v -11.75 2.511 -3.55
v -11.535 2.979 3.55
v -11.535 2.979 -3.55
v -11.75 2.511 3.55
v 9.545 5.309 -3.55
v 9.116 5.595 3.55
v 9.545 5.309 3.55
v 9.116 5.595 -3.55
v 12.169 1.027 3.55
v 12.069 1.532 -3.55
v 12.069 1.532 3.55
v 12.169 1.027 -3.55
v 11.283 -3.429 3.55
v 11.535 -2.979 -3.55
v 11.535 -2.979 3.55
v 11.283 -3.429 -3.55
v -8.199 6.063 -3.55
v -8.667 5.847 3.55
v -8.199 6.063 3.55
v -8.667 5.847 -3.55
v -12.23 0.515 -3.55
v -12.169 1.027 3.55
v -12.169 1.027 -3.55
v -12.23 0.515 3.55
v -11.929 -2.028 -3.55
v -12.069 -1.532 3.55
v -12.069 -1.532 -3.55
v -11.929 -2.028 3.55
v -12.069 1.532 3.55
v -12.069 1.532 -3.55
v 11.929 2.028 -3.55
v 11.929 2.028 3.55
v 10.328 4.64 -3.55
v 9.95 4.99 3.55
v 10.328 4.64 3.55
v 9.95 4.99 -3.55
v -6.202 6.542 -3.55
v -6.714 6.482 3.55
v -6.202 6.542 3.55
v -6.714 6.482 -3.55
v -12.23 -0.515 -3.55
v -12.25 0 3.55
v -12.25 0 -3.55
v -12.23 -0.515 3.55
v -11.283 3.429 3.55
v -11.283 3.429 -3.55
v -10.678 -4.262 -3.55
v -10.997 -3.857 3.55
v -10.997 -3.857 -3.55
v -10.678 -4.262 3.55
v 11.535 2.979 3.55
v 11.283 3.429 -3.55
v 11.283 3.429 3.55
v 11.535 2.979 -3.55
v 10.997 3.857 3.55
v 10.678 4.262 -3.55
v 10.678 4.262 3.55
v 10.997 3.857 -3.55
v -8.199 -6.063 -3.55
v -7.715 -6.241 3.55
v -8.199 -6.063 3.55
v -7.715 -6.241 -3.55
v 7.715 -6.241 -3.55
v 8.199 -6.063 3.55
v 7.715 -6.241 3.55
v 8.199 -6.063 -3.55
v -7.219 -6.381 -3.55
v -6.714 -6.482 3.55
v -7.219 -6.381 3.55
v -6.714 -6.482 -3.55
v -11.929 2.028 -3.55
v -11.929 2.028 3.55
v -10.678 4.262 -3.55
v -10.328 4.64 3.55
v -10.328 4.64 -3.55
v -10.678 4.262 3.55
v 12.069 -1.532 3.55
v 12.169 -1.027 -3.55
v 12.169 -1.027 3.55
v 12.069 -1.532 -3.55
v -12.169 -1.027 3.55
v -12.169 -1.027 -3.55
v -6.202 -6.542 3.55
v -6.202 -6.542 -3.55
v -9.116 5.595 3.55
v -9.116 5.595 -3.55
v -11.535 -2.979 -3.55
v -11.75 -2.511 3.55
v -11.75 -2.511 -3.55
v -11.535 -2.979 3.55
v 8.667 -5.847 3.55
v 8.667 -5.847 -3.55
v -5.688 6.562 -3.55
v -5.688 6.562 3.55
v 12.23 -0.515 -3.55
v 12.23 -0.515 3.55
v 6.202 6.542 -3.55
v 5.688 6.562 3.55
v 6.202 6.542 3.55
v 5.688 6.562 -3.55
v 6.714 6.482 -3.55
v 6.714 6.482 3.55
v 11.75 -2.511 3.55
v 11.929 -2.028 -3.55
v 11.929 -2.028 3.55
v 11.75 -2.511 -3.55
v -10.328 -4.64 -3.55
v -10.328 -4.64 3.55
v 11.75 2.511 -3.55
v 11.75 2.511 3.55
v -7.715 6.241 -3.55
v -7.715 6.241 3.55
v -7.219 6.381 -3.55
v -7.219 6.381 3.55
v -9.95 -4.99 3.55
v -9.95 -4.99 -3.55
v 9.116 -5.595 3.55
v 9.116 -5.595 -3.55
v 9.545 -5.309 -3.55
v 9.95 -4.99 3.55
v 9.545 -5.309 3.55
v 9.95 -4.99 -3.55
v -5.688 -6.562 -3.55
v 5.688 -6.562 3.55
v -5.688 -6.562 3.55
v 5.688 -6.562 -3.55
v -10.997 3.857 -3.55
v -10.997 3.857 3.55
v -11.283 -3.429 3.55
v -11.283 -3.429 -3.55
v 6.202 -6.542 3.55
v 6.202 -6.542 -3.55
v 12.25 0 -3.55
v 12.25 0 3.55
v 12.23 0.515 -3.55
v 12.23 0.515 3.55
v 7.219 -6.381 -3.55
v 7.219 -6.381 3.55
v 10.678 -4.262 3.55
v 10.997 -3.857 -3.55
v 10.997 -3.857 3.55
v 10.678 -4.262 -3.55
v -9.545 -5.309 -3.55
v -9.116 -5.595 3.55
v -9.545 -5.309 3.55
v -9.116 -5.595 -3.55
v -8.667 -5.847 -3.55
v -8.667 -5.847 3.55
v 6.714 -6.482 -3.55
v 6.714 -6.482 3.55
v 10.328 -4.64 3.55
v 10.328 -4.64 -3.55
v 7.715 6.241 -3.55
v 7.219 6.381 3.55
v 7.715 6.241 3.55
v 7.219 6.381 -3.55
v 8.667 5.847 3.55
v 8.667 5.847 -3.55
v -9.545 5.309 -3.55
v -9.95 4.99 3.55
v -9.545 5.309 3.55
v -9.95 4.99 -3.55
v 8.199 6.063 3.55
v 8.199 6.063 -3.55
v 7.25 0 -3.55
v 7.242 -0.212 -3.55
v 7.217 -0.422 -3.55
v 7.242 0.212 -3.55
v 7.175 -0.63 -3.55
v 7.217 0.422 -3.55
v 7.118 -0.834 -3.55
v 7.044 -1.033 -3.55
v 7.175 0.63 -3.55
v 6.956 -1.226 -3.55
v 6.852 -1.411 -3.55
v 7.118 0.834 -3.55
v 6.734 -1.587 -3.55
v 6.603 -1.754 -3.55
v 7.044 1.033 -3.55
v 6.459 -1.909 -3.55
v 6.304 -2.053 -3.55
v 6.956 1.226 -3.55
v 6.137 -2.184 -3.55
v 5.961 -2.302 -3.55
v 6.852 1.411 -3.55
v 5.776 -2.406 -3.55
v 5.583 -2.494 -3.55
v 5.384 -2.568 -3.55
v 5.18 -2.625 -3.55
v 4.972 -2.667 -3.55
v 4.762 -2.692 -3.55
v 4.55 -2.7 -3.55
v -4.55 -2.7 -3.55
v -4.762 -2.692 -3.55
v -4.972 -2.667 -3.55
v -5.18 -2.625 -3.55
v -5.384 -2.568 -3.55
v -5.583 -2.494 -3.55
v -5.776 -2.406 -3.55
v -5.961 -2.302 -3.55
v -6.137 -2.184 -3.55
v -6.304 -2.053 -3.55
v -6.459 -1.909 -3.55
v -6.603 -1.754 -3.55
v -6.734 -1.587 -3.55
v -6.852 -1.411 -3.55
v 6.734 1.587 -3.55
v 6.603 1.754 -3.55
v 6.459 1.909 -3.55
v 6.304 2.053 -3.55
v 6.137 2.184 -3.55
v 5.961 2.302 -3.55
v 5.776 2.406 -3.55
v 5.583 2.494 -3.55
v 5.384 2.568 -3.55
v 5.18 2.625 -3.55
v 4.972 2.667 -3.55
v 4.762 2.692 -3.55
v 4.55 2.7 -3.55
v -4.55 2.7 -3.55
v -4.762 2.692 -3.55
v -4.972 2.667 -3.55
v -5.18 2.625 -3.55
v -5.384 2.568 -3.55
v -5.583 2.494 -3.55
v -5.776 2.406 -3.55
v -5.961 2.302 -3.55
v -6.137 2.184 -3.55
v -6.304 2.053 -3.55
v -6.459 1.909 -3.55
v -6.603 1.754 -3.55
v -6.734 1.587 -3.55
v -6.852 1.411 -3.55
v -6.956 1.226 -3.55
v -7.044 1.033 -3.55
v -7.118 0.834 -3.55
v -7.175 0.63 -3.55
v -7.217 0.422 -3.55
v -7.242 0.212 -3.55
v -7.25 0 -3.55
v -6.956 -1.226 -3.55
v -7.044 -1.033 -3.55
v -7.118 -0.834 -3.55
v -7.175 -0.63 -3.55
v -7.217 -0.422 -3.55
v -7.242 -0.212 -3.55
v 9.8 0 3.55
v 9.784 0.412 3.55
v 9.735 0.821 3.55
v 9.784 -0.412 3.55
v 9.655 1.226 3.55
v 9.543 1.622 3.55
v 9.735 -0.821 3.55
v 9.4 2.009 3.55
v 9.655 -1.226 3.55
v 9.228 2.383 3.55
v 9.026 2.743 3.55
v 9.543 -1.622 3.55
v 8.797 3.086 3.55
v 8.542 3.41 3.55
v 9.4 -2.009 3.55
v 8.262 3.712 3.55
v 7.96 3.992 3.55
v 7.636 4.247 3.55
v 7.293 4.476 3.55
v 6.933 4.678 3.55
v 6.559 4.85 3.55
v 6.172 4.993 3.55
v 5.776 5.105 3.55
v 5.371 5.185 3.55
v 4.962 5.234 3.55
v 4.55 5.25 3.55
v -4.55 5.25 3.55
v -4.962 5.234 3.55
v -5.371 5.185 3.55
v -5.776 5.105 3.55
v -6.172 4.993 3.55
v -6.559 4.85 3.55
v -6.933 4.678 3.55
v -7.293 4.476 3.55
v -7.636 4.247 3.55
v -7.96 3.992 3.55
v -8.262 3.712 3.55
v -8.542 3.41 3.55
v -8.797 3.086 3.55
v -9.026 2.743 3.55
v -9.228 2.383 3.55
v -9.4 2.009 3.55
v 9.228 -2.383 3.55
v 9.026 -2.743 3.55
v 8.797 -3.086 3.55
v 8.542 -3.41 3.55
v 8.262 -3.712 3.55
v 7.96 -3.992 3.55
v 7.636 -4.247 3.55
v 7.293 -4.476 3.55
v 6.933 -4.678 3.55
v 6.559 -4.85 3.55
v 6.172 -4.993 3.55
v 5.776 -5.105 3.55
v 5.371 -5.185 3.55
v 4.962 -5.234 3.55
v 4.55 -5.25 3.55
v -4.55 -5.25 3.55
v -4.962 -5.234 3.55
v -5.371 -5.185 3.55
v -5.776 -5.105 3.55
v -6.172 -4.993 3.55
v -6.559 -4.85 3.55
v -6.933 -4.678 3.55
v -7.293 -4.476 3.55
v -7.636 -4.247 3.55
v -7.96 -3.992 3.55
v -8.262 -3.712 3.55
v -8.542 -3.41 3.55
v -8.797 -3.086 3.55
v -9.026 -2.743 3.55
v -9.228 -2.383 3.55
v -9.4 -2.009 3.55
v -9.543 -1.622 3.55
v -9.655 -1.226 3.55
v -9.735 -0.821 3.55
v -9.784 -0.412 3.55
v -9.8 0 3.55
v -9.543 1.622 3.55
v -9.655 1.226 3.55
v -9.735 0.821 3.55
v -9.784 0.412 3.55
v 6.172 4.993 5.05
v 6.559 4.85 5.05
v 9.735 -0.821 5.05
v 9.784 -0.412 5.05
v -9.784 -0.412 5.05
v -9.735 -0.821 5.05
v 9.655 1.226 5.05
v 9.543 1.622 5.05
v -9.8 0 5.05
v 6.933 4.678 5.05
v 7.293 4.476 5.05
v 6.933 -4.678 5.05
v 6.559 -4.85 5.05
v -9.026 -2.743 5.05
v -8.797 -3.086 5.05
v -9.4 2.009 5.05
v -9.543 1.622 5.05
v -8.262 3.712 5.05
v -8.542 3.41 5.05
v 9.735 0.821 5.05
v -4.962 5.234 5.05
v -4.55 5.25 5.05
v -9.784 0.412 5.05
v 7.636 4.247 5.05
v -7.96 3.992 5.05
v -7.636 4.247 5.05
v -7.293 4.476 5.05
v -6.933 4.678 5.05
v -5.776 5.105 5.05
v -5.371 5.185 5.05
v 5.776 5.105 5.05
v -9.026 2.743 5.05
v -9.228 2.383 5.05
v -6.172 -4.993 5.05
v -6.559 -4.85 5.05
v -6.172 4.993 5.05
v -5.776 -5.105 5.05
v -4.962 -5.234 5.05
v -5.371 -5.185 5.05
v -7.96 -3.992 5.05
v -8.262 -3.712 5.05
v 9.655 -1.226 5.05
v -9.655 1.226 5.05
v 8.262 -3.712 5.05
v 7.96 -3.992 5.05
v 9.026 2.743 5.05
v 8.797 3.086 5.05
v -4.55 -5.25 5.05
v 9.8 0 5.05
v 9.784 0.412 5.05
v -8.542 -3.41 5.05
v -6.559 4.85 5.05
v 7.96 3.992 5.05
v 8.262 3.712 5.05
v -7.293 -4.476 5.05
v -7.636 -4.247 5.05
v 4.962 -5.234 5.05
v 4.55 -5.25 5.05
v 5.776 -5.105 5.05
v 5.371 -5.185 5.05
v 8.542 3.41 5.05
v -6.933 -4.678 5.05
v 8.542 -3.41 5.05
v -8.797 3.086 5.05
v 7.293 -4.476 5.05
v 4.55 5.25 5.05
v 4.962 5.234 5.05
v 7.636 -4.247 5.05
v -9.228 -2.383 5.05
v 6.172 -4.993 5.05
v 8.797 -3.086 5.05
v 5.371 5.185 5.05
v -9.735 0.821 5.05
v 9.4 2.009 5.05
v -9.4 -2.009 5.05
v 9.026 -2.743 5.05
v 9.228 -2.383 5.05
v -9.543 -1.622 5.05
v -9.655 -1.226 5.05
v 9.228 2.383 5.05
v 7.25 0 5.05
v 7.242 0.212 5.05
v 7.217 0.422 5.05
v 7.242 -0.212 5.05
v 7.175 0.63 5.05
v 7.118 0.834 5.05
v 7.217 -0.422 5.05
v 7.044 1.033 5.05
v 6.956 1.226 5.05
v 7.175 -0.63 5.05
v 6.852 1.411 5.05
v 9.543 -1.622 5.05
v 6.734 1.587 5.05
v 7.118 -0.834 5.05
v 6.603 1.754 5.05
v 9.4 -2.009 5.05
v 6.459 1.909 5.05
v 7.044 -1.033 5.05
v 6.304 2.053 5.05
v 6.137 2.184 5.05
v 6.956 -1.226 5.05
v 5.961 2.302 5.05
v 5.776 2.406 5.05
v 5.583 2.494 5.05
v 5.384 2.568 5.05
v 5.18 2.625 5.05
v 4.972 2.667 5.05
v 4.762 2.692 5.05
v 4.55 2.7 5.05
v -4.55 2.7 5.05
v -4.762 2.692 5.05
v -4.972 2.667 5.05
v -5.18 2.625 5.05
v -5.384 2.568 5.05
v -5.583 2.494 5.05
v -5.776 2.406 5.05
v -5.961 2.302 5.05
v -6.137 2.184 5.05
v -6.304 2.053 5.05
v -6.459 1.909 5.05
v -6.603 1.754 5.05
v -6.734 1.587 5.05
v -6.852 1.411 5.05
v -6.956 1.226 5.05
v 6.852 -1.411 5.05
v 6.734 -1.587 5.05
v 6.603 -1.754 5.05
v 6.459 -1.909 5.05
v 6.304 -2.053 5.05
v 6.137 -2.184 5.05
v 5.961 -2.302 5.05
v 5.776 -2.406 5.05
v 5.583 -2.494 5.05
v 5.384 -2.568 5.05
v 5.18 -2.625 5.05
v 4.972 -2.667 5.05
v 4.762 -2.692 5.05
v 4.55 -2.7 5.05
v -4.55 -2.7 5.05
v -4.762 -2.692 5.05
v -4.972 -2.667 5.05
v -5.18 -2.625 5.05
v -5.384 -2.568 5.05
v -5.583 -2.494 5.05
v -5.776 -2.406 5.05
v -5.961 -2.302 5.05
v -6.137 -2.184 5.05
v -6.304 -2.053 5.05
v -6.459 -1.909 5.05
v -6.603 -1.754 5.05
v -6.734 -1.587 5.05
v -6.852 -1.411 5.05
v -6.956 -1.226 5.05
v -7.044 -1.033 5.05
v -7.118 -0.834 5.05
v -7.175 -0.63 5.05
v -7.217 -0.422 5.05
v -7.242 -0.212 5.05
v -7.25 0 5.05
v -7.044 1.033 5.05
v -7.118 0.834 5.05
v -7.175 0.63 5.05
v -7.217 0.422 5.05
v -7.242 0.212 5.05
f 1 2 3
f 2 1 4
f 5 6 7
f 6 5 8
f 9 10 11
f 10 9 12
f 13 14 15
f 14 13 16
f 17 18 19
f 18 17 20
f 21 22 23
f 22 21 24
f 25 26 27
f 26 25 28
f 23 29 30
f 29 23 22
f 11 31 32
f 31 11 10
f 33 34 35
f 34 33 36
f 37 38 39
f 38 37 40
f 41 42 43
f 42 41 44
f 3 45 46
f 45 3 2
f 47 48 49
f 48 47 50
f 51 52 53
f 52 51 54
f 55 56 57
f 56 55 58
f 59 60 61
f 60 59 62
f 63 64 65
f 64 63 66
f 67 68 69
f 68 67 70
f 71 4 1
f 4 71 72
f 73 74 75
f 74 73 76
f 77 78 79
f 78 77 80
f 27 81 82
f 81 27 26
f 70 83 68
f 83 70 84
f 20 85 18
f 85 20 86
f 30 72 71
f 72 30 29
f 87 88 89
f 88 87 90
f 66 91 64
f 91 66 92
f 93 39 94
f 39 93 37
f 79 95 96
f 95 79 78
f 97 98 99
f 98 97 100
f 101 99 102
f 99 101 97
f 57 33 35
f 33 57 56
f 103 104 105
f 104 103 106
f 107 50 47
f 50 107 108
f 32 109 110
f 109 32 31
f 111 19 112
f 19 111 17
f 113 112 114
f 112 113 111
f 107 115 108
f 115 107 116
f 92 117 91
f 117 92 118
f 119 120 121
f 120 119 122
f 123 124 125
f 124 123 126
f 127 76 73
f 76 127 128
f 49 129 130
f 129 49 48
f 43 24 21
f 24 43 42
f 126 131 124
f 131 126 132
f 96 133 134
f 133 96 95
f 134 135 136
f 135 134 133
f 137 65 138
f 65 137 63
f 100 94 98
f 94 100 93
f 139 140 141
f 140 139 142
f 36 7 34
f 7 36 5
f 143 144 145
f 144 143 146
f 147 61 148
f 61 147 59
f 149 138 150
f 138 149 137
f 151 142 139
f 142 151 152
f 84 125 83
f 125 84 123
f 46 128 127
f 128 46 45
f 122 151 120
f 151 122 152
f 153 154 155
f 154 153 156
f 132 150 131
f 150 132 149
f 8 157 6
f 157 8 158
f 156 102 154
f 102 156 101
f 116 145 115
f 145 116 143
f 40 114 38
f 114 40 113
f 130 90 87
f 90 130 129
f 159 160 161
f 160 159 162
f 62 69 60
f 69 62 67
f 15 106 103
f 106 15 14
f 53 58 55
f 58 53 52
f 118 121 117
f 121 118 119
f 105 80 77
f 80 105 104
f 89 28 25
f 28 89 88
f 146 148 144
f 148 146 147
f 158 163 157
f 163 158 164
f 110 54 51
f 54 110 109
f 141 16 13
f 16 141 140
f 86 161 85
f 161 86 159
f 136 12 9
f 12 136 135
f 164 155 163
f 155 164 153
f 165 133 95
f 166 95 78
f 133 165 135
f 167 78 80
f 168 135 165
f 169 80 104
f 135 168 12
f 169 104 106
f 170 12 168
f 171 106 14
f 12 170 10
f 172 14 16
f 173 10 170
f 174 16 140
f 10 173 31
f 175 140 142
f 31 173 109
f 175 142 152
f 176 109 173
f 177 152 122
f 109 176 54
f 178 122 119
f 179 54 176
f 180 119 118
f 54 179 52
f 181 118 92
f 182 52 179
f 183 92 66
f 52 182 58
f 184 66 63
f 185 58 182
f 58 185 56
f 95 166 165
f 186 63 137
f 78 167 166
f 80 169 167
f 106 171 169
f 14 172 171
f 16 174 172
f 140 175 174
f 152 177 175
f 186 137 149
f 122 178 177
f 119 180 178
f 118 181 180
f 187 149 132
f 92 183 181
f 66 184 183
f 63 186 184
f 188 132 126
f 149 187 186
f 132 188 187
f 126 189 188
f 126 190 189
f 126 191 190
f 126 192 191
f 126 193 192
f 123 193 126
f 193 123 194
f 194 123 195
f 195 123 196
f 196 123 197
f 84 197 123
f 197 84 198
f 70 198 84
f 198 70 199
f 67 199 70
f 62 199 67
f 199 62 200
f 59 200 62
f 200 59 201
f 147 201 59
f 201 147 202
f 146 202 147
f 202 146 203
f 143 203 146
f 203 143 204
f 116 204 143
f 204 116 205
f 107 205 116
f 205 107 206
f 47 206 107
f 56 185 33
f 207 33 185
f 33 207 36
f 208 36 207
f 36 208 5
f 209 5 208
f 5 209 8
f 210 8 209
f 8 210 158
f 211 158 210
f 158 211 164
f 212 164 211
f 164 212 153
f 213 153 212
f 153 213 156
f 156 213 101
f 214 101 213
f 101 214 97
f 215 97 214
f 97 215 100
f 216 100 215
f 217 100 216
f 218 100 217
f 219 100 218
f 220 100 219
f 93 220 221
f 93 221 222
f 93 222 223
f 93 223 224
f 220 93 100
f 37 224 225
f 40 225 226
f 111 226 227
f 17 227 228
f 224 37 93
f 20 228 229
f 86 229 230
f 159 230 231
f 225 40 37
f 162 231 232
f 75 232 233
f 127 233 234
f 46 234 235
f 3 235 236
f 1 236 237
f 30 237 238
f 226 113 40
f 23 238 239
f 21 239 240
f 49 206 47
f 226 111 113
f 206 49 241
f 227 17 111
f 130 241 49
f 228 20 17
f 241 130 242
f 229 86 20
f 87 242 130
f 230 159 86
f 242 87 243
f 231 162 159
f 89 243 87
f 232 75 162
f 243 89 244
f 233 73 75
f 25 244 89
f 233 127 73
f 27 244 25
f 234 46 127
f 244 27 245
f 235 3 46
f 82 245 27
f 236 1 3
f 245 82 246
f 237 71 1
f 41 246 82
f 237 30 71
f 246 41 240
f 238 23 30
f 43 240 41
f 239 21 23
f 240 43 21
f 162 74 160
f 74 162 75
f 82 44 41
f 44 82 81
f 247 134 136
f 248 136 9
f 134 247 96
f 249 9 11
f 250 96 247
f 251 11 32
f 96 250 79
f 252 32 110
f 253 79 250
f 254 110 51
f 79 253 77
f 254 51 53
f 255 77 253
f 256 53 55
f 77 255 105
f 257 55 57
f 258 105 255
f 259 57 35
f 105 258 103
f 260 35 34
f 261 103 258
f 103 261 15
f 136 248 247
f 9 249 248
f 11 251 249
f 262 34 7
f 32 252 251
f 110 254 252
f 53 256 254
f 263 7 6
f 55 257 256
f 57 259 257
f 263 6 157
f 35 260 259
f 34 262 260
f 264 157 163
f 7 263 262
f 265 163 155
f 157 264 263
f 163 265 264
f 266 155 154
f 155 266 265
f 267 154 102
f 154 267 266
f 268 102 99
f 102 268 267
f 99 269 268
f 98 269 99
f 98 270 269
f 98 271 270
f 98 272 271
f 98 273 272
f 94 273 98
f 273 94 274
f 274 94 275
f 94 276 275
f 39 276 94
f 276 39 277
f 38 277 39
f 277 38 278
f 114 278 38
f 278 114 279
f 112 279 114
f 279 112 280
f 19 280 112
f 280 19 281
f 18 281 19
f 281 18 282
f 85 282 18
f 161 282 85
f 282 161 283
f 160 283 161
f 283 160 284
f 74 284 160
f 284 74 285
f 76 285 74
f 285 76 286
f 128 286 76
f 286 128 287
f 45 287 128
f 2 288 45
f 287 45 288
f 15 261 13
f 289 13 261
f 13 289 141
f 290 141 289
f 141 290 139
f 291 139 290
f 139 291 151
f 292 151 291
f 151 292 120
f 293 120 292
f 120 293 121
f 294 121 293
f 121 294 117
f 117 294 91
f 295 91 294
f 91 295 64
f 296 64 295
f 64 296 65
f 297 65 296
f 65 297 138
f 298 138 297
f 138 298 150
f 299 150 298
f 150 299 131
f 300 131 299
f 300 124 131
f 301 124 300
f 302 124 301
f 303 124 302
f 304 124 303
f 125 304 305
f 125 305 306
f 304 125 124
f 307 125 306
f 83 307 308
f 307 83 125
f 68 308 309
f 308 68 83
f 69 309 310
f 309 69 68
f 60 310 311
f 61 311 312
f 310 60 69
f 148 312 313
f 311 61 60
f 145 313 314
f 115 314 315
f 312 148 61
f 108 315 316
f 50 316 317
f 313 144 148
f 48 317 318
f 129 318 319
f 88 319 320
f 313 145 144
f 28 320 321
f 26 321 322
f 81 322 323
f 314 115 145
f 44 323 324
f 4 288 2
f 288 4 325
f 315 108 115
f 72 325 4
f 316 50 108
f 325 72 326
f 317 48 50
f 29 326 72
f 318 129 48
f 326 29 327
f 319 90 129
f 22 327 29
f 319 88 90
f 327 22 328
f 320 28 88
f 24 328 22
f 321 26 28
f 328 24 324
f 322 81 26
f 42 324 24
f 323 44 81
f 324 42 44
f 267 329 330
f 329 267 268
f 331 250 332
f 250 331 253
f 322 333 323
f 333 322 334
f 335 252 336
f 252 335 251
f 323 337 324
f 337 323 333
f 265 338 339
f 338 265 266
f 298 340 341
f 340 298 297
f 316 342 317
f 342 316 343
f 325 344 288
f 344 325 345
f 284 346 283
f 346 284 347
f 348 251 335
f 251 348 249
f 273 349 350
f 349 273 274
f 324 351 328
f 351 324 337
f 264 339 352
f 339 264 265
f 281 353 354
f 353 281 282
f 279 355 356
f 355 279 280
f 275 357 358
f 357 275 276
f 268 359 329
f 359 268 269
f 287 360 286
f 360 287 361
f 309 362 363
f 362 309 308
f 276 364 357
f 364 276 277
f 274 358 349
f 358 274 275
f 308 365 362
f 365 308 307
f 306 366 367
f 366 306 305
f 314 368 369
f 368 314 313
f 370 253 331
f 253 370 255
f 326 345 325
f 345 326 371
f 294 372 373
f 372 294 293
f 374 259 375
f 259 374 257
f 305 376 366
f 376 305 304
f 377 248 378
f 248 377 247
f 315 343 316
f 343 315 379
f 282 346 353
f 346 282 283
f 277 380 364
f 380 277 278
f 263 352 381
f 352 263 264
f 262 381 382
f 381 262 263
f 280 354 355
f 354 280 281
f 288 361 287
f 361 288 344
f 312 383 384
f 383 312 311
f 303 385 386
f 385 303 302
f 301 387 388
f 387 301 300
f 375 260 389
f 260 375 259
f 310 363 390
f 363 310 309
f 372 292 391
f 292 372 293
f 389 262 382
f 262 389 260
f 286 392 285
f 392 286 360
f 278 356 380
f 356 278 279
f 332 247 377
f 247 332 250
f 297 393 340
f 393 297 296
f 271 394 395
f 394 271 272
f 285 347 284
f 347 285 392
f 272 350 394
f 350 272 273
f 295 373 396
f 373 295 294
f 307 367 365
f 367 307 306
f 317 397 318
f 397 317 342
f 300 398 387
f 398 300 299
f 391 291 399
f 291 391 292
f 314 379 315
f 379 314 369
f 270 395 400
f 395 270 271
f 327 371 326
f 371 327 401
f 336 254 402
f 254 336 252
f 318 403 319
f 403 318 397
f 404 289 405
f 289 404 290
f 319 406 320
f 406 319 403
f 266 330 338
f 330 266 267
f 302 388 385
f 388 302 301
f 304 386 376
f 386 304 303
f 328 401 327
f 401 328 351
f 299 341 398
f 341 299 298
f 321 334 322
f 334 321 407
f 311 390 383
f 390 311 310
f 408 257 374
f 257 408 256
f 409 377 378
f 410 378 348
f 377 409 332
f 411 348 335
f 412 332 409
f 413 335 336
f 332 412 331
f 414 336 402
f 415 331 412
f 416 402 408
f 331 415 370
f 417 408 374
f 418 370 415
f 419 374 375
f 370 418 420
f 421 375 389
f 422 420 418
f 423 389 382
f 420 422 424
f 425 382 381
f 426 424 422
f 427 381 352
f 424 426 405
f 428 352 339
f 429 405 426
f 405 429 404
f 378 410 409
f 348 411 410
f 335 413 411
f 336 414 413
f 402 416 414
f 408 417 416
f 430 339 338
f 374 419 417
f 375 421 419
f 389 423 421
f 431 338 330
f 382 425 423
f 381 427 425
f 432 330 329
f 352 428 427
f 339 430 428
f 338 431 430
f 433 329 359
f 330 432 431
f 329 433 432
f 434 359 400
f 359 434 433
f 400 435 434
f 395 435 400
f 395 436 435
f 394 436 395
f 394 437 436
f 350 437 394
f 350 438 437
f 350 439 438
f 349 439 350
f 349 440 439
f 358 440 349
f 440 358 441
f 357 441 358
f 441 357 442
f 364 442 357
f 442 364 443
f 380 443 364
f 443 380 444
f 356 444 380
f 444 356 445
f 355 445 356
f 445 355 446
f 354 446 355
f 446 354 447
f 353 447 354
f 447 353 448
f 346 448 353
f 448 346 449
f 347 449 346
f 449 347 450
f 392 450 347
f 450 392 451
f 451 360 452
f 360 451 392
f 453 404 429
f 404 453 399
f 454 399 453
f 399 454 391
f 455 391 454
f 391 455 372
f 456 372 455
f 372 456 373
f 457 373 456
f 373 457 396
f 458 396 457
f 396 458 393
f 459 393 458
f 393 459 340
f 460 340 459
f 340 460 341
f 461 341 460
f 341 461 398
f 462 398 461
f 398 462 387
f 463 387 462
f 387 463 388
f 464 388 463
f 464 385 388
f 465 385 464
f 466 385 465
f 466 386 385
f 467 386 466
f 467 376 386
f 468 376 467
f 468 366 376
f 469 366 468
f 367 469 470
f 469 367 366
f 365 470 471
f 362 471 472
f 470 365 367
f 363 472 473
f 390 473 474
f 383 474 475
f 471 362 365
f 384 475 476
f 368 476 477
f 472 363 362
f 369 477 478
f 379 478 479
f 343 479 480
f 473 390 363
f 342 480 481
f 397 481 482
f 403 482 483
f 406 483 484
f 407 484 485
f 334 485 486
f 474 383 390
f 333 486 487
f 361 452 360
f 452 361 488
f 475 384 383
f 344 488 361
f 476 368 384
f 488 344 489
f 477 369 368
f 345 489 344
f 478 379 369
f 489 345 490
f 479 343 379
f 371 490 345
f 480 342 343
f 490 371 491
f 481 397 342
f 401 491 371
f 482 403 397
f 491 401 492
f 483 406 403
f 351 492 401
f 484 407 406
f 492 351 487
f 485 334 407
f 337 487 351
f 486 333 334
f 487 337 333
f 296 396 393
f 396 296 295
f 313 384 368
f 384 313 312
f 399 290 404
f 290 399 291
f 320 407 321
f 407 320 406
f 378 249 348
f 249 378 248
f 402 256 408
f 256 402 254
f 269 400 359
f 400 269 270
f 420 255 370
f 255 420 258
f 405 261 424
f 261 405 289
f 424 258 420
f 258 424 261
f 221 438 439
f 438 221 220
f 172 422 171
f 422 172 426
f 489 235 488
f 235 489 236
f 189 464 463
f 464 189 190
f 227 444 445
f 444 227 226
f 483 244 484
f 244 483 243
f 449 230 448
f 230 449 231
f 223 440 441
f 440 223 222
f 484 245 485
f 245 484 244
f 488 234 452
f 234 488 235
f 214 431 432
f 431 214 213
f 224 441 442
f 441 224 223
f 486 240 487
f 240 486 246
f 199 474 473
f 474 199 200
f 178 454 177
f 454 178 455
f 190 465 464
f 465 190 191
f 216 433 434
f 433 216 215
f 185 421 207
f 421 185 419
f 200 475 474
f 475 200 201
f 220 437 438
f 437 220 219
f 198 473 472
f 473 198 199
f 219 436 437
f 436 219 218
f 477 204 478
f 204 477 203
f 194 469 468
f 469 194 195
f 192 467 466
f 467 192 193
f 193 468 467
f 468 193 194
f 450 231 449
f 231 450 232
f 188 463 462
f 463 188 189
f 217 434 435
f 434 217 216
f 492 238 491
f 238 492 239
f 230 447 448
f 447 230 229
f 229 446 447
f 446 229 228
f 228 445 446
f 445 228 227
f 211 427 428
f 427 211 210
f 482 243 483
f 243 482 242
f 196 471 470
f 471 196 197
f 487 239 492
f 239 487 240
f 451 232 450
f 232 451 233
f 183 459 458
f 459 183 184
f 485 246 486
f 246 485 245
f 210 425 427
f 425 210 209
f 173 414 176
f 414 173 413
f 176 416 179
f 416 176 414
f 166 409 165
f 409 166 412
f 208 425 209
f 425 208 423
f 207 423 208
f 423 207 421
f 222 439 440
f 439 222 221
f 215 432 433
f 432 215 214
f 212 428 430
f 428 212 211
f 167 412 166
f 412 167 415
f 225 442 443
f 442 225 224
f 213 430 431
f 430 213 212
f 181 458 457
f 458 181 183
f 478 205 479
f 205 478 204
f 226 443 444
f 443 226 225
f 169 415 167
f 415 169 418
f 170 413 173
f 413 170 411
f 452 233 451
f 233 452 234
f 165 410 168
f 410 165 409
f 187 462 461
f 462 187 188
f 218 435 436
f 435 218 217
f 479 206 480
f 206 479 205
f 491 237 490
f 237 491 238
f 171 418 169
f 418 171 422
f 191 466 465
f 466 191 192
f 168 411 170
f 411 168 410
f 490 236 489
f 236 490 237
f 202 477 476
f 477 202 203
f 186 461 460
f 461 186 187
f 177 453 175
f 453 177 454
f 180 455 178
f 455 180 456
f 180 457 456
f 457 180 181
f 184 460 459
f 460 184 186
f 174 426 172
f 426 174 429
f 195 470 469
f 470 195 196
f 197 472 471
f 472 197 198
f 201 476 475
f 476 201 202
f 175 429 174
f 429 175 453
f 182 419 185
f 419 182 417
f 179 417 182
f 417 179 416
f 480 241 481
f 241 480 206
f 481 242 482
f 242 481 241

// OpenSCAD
$fn=80;

module spacer(oo_width = 24.5, o_width=19.6, od=10.5, i_width = 14.5, id=5.4, h1=7.1, h2=1.5){
    ood = od*(oo_width/o_width);
    
    difference(){
        union(){
            // outermost oval
            echo("OOD ", ood);
            echo("oo_width ", oo_width);
            hull(){
                translate([(oo_width-ood)/2, 0, 0]){
                    cylinder(h=h1, d = ood, center=true);
                }
                translate([-(oo_width-ood)/2, 0, 0]){
                    cylinder(h=h1, d = ood, center=true);
                }
            }

            // middle oval
            echo("OD ", od);
            echo("o_width ", o_width);
            hull(){
                translate([(o_width-od)/2, 0, h2]){
                    cylinder(h=h1, d = od, center=true);
                }
                translate([-(o_width-od)/2, 0, h2]){
                    cylinder(h=h1, d = od, center=true);
                }
            }
        }
    
        // inner cutout oval
        echo("iD ", id);
        echo("iwidth", i_width);
        hull(){
            translate([(i_width-id)/2, 0, 2.5]){
                cylinder(h=18.5, d = id, center=true);
            }
            translate([-(i_width-id)/2, 0, 2.5]){
                cylinder(h=18.5, d = id, center=true);
            }
        }
    }
}


spacer();
    
